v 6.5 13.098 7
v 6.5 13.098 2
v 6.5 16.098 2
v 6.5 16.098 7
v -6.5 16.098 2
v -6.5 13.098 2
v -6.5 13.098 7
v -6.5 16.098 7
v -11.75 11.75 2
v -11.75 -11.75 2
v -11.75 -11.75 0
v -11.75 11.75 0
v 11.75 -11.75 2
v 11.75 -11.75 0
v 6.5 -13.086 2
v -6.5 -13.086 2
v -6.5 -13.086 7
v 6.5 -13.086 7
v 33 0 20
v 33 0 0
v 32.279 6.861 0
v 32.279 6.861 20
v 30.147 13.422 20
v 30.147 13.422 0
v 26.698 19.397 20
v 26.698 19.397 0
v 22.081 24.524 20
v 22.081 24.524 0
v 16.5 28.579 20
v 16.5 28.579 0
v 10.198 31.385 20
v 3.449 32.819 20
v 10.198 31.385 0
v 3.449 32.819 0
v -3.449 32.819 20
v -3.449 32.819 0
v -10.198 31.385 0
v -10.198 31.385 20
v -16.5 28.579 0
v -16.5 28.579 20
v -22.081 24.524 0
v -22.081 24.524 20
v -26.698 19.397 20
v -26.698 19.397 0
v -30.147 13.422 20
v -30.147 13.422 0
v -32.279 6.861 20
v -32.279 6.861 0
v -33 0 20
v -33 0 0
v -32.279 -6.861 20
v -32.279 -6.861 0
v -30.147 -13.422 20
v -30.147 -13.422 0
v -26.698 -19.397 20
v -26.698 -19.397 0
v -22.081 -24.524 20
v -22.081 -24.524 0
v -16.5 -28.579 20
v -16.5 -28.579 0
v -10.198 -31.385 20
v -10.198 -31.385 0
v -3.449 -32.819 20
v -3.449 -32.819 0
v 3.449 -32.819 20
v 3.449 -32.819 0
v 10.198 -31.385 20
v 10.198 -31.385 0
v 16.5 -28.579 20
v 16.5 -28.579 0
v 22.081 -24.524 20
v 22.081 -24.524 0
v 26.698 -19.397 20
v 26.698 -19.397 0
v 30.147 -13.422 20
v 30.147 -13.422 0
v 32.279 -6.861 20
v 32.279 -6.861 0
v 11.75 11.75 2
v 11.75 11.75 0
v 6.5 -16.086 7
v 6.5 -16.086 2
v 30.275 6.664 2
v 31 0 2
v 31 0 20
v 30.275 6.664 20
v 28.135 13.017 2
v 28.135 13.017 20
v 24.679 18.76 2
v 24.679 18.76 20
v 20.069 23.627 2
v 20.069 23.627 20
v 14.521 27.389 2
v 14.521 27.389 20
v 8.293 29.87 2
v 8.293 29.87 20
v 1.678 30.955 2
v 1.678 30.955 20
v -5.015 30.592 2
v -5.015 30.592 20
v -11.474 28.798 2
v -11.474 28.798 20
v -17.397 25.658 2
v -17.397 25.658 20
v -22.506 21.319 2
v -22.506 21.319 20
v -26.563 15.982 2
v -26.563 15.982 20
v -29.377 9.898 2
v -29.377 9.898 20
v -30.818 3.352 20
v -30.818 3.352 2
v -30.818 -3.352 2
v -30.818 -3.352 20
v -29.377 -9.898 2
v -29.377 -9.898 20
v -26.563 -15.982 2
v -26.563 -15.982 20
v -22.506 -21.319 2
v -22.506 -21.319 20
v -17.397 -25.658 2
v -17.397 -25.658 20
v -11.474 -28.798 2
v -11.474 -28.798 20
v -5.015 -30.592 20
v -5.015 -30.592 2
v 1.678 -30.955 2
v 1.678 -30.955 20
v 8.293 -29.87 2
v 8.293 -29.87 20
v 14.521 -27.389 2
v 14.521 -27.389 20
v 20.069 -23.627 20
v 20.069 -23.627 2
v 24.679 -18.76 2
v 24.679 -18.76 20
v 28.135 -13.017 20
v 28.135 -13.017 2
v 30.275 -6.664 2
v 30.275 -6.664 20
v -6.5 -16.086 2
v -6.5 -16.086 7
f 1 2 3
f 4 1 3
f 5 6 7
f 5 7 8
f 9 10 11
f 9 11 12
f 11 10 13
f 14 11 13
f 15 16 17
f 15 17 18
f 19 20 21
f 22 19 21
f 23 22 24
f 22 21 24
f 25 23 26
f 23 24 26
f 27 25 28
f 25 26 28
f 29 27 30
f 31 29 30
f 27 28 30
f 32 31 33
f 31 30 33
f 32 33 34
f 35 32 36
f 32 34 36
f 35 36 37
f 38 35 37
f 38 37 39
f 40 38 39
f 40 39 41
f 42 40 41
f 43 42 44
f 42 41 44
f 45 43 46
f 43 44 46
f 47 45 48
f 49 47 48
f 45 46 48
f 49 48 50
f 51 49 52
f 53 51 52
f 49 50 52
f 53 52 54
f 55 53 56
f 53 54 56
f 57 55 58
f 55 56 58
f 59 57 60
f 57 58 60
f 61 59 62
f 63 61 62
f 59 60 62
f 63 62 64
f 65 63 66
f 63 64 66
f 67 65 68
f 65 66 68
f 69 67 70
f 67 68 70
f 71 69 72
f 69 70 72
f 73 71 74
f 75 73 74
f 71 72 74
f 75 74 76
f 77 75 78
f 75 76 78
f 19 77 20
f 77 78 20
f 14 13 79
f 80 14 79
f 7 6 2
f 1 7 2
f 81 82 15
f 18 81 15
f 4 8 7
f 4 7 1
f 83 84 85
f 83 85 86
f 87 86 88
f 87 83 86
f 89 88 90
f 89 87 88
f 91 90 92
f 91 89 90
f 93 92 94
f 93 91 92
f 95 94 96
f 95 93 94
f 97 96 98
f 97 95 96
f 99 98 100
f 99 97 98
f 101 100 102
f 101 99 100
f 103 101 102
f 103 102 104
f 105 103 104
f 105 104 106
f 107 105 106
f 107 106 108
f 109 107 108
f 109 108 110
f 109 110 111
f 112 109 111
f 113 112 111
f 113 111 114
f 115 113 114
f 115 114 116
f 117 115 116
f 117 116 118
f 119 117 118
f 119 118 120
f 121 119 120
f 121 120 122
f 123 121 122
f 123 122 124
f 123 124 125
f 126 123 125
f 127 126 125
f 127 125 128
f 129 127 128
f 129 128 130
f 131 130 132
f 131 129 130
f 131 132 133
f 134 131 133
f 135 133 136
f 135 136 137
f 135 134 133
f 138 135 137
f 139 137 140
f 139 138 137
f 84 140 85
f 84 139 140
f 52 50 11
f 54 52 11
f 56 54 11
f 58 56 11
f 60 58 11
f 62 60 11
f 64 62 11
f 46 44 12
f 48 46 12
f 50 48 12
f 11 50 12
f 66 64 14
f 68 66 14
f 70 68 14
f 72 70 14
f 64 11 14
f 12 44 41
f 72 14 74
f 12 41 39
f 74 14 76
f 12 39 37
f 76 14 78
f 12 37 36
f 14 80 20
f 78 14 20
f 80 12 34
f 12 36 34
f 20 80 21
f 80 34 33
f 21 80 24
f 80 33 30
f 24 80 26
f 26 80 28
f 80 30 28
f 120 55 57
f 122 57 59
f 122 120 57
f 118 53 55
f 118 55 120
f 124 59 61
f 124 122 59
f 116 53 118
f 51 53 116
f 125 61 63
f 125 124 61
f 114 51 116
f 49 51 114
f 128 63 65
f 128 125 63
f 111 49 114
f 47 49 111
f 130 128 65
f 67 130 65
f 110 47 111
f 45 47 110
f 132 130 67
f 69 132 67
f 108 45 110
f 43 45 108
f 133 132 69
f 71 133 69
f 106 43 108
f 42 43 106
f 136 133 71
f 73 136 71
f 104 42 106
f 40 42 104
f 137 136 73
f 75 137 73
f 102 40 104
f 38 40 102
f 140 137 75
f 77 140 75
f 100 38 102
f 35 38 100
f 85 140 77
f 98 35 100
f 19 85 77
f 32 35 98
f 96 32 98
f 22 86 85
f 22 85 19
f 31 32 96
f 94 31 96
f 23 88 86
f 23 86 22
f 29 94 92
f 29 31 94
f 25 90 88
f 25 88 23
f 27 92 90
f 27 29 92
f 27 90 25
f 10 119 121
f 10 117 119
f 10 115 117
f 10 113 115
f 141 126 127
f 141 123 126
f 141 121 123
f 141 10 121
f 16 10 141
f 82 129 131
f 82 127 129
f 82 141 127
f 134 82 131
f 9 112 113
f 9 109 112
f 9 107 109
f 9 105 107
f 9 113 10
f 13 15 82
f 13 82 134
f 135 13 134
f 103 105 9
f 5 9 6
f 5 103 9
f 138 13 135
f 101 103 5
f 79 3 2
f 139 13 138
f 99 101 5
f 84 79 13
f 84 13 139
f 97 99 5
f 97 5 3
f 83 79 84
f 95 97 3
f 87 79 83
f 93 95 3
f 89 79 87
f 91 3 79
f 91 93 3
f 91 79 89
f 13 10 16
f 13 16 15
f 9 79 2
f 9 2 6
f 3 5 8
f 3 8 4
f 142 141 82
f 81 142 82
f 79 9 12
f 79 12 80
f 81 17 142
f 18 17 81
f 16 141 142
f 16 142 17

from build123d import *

# Parameters (mm, degrees)
F0_R     = 33
F1_DEPTH = 20
F2_T     = -2
F3_DEPTH = 102
F4_W     = 23.5
F4_H     = 23.5
F5_DEPTH = 12.5
F6_W     = 13
F6_H     = 3
F6_H_2   = 2.9999976491
F7_DEPTH = 7


# Not quite as in the source:
# - an extrude ends at something that could not be found from the text; its depth is read off the source's solid


with BuildPart() as f1:
    # F0 (on Top) → F1 (new body)
    with BuildSketch(Plane.XY):
        Circle(F0_R)
    extrude(amount=F1_DEPTH)

    # F2
    f2_openings = [f1.faces().sort_by_distance(p)[0] for p in [
        (0, 0, 20),
    ]]
    offset(amount=F2_T, openings=f2_openings)

    # F0 (on Top) → F3 (cut, through all)
    with BuildSketch(Plane.XY):
        Circle(F0_R)
    extrude(amount=-F3_DEPTH, mode=Mode.SUBTRACT)

    # F4 (on face) → F5 (cut, symmetric)
    with BuildSketch(Plane.XY):
        Rectangle(F4_W, F4_H)
    extrude(amount=F5_DEPTH, both=True, mode=Mode.SUBTRACT)

    # F6 (on Top) → F7 (join)
    with BuildSketch(Plane.XY):
        with Locations((0, 14.5980315283)):
            Rectangle(F6_W, F6_H)
        with Locations((0, -14.5859429613)):
            Rectangle(F6_W, F6_H_2)
    extrude(amount=F7_DEPTH)


solid = f1.part
